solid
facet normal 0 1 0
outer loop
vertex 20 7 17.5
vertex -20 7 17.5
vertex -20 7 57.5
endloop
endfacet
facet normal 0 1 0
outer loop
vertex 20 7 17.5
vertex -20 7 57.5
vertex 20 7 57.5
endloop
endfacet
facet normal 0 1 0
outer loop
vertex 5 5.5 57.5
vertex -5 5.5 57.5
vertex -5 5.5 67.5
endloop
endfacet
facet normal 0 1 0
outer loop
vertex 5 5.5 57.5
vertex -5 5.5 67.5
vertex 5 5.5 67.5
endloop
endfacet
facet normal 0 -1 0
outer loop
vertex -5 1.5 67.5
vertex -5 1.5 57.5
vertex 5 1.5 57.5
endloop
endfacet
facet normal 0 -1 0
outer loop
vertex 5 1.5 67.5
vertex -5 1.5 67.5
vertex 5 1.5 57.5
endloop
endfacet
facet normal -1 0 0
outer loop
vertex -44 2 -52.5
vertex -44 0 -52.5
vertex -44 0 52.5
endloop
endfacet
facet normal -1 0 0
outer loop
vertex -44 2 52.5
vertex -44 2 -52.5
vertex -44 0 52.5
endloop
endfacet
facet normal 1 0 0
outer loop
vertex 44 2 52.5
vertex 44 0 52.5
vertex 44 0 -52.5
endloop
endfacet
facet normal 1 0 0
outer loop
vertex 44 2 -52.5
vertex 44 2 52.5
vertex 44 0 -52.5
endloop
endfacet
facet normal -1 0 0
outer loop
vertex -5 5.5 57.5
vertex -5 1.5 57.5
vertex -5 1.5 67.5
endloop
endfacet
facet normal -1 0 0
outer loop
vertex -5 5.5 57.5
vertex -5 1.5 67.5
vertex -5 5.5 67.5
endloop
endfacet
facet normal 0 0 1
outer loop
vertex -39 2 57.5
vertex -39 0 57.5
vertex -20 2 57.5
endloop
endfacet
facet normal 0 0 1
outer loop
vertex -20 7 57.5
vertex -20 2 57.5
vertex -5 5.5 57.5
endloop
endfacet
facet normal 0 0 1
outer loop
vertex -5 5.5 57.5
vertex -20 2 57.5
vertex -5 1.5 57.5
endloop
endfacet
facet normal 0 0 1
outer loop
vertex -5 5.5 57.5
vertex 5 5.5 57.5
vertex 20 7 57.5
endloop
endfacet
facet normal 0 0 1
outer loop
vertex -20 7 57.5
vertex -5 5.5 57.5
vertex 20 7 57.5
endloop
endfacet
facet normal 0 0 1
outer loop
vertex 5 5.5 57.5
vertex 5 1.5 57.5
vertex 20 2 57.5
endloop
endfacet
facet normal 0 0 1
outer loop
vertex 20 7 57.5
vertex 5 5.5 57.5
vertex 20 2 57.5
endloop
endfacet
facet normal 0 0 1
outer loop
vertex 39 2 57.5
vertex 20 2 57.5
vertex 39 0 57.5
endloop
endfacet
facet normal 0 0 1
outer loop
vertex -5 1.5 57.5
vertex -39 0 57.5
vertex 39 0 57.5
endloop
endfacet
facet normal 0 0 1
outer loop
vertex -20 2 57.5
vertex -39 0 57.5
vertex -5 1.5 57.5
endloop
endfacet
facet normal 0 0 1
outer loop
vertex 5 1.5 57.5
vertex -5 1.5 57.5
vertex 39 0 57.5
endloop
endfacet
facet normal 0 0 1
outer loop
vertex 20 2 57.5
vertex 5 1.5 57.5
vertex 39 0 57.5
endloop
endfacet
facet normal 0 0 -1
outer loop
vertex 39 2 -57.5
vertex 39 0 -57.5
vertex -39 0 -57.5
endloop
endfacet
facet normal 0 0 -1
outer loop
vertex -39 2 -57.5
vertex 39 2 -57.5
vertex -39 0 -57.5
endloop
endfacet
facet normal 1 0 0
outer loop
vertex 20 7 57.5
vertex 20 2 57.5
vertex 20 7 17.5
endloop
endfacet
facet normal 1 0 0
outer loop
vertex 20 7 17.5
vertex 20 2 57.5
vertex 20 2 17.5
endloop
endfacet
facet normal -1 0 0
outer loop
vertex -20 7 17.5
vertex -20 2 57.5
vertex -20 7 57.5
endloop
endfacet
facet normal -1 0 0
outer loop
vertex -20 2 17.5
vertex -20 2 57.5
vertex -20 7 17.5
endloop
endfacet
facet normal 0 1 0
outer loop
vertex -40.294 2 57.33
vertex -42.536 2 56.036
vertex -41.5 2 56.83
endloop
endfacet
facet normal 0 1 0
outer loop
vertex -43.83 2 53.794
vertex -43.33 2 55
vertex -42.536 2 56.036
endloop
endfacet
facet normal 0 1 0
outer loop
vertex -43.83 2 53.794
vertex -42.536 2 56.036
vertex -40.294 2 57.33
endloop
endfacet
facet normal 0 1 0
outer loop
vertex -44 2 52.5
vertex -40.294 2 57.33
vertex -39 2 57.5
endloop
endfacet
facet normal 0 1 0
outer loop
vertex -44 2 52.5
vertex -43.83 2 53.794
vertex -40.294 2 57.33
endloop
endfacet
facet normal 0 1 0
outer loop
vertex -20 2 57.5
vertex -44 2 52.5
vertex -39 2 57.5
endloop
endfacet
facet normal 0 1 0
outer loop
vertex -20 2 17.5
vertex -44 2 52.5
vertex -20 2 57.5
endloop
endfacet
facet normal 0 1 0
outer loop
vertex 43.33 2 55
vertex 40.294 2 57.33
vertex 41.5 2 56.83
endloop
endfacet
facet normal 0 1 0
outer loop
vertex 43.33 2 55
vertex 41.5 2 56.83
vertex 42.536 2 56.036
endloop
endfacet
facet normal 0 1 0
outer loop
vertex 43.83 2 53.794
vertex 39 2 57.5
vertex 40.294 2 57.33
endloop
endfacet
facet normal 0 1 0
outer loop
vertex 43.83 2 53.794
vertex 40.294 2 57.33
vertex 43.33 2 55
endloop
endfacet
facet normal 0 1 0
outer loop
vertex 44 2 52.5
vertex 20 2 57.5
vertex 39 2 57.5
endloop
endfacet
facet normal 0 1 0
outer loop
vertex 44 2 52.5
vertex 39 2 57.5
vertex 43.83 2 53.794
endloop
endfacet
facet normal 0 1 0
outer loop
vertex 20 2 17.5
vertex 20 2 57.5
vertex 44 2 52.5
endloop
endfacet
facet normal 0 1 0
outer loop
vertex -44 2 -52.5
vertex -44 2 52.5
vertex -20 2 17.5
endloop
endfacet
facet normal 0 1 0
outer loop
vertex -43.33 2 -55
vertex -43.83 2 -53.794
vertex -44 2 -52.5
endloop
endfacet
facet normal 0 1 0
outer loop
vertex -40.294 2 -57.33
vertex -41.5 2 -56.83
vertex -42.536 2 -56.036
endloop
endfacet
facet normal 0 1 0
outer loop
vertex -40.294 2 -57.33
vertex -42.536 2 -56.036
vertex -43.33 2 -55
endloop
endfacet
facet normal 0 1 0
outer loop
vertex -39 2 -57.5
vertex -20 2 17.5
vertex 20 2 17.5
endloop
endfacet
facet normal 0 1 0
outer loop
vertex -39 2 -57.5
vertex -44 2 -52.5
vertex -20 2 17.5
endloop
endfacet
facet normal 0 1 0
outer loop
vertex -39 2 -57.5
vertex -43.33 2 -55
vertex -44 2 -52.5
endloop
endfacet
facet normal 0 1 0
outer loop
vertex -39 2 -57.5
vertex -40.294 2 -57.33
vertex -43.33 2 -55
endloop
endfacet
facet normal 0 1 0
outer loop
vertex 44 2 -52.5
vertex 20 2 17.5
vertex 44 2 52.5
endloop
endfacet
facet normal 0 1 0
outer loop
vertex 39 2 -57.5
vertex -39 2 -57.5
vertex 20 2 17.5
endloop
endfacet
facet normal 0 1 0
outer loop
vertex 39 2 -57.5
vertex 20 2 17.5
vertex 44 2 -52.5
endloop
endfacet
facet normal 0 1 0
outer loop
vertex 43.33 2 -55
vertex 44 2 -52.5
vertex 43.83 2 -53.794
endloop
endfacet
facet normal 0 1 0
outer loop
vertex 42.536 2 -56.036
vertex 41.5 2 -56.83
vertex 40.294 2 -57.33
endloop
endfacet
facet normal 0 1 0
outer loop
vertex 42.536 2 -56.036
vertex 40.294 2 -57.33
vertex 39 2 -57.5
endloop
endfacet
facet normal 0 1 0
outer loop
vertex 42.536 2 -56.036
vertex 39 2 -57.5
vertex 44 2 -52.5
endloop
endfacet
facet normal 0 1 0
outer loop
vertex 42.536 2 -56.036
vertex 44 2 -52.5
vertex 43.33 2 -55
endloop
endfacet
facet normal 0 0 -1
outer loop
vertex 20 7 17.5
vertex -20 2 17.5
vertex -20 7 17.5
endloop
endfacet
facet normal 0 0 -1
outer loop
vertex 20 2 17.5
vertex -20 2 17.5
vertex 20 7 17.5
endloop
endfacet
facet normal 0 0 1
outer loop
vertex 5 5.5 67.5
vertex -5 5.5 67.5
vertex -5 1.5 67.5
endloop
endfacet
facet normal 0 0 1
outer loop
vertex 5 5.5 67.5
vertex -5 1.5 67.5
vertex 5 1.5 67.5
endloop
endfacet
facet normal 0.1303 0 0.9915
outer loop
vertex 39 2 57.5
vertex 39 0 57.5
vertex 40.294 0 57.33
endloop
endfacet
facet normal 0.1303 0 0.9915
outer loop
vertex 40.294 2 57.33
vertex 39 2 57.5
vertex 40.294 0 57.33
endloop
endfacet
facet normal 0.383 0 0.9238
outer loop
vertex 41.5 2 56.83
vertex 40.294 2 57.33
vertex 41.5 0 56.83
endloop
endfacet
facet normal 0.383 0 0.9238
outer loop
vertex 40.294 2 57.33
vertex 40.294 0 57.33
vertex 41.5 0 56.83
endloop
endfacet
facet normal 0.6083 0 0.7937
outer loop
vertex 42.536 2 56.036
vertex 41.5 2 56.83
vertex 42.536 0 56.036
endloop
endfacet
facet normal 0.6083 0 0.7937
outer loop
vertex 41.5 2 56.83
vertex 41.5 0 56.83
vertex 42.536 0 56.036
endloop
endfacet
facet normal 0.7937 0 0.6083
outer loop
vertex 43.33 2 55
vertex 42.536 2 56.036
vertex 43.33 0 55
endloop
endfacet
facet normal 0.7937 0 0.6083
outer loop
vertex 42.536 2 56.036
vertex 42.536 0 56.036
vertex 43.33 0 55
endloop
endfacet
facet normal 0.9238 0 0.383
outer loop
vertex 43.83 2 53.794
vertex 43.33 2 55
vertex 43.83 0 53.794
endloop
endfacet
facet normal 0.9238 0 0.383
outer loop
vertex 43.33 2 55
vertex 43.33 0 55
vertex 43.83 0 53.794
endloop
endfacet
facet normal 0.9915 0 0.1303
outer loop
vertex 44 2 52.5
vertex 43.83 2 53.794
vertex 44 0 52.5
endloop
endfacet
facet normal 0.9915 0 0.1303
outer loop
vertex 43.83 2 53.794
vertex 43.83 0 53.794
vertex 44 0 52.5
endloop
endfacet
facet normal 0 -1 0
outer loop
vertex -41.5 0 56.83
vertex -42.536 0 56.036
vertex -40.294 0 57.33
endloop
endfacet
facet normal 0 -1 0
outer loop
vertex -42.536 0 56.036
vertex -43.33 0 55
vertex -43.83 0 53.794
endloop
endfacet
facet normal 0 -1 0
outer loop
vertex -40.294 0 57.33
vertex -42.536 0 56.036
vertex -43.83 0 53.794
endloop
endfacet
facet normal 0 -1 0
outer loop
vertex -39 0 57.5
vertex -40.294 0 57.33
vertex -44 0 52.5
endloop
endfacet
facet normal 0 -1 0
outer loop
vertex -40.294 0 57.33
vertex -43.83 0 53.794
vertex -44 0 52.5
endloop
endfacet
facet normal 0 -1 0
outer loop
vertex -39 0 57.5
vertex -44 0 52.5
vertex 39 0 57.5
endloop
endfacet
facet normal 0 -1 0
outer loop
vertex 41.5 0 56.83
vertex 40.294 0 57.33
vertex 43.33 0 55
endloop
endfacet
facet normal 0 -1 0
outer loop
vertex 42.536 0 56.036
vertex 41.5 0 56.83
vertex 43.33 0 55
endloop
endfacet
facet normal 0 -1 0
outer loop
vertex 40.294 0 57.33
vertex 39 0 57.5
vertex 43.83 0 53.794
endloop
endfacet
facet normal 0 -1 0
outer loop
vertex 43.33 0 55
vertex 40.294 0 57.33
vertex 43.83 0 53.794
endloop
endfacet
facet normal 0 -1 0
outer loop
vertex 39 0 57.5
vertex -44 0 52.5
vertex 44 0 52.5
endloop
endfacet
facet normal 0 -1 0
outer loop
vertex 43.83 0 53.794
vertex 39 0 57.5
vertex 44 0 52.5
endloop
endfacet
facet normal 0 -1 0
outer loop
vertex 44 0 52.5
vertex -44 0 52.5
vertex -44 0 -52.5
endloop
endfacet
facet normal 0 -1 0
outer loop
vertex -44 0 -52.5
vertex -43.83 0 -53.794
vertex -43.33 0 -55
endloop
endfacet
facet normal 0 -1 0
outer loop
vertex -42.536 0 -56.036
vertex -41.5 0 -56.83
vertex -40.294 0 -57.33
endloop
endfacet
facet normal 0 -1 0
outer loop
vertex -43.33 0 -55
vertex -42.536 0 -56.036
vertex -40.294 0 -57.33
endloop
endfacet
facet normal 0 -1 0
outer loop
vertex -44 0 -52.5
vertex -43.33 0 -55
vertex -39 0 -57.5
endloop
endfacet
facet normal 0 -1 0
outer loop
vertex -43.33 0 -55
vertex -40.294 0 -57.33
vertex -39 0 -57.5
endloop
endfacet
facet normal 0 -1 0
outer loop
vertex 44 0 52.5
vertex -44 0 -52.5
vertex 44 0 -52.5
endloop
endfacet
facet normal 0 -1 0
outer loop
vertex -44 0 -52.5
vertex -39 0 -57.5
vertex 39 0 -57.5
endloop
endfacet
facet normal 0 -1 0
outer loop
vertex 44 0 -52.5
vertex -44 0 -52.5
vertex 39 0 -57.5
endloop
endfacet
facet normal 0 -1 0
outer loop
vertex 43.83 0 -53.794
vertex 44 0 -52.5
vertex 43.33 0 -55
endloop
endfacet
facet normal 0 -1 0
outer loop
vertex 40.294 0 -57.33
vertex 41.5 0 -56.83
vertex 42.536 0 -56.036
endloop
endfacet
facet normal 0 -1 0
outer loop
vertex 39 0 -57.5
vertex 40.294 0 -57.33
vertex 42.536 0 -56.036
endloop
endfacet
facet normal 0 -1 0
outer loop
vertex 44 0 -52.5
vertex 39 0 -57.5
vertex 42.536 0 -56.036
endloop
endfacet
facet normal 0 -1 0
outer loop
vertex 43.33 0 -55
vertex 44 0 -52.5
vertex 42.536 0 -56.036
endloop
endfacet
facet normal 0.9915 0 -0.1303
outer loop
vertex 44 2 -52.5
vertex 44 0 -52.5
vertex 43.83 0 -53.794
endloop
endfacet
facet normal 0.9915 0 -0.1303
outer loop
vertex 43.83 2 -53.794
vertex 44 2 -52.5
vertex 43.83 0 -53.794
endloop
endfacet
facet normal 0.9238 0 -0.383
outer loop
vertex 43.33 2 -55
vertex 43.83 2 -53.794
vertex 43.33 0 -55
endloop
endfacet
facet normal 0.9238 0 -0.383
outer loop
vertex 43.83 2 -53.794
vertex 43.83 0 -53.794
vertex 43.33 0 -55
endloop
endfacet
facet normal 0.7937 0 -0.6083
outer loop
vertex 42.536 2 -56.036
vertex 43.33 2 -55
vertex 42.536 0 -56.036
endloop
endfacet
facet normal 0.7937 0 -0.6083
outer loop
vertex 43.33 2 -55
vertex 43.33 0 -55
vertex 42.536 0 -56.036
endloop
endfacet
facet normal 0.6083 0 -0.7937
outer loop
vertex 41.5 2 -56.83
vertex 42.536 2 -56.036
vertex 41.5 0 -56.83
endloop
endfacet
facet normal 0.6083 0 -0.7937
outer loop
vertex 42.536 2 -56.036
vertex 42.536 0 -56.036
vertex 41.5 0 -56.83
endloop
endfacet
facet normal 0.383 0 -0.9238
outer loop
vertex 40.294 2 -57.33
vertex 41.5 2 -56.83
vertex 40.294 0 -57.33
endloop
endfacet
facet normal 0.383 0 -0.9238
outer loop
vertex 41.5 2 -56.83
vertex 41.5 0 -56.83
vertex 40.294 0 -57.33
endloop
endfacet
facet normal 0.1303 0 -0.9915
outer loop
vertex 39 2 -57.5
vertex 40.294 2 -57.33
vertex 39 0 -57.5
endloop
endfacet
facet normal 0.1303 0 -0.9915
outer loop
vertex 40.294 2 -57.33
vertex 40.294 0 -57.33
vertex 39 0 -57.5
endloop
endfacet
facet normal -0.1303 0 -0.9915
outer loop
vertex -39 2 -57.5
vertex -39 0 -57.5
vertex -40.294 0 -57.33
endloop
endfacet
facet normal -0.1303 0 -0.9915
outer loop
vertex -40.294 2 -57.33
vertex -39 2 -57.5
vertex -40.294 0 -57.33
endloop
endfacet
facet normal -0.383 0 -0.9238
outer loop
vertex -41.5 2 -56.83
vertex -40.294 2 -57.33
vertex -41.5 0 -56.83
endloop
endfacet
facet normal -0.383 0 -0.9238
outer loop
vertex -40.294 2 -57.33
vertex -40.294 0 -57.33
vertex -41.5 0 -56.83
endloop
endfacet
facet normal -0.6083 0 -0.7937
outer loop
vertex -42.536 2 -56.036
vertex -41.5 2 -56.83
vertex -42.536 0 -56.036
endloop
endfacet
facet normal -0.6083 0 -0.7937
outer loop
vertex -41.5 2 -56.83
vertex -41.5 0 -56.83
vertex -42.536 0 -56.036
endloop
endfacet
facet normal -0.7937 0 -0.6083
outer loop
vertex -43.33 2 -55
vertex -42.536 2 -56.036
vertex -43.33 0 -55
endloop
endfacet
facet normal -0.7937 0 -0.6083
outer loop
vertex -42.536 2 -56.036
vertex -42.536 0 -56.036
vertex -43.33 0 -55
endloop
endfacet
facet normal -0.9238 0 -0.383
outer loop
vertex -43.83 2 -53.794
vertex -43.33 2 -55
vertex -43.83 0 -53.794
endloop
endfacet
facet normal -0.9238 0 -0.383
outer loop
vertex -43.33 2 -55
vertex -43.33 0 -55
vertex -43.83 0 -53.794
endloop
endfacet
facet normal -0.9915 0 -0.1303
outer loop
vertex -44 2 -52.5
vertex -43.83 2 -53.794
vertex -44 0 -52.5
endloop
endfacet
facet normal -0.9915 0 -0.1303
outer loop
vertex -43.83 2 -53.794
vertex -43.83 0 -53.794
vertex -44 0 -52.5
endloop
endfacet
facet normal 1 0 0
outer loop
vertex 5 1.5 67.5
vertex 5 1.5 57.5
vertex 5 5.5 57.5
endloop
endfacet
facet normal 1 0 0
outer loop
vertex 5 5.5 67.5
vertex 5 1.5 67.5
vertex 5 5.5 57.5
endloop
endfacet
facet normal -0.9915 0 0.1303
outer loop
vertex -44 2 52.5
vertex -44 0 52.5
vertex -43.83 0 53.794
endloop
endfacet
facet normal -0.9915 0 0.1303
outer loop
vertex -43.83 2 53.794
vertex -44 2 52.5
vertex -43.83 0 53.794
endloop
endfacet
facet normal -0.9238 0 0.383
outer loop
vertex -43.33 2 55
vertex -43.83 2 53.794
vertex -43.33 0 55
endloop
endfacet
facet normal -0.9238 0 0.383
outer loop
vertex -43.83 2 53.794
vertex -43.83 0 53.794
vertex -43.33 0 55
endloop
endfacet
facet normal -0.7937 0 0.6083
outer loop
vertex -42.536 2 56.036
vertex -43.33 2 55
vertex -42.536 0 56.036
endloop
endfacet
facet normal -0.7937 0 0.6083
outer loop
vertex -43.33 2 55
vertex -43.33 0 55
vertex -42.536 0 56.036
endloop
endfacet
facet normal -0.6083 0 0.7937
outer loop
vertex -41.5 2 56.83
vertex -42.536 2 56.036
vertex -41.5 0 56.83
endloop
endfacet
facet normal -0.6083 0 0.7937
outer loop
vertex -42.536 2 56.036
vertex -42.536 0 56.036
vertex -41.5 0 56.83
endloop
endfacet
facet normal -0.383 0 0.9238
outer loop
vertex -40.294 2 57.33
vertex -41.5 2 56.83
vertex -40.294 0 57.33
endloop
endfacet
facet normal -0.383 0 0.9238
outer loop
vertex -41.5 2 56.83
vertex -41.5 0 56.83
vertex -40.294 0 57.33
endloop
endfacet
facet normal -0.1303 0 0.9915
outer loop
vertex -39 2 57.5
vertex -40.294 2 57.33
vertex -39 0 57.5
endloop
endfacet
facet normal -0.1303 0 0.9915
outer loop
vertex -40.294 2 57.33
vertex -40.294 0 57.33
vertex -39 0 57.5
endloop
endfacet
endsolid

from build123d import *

# Parameters (mm, degrees)
BOSS_EXTRUDE4_DEPTH = 2
SKETCH6_W           = 40
SKETCH6_H           = 40
BOSS_EXTRUDE5_DEPTH = 5
SKETCH7_W           = 10
SKETCH7_H           = 4
BOSS_EXTRUDE6_DEPTH = 10


with BuildPart() as part:
    # Sketch5 → Boss-Extrude4 (new body)
    with BuildSketch(Plane(origin=(0, 0, 0), x_dir=(1, 0, 0), z_dir=(0, 1, 0))):
        with BuildLine():
            Line((39, 57.5), (-39, 57.5))
            ThreePointArc((-39, 57.5), (-42.535533906, 56.035533906), (-44, 52.5))
            Line((-44, 52.5), (-44, -52.5))
            ThreePointArc((-44, -52.5), (-42.535533906, -56.035533906), (-39, -57.5))
            Line((-39, -57.5), (39, -57.5))
            ThreePointArc((39, -57.5), (42.535533906, -56.035533906), (44, -52.5))
            Line((44, -52.5), (44, 52.5))
            ThreePointArc((44, 52.5), (42.535533906, 56.035533906), (39, 57.5))
        make_face()
    extrude(amount=BOSS_EXTRUDE4_DEPTH)

    # Sketch6 → Boss-Extrude5 (add)
    with BuildSketch(Plane(origin=(0, 2, 0), x_dir=(1, 0, 0), z_dir=(0, 1, 0))):
        with Locations((0, -37.5)):
            Rectangle(SKETCH6_W, SKETCH6_H)
    extrude(amount=BOSS_EXTRUDE5_DEPTH)

    # Sketch7 → Boss-Extrude6 (add)
    with BuildSketch(Plane.XY.offset(57.5)):
        with Locations((0, 3.5)):
            Rectangle(SKETCH7_W, SKETCH7_H)
    extrude(amount=BOSS_EXTRUDE6_DEPTH)


solid = part.part
